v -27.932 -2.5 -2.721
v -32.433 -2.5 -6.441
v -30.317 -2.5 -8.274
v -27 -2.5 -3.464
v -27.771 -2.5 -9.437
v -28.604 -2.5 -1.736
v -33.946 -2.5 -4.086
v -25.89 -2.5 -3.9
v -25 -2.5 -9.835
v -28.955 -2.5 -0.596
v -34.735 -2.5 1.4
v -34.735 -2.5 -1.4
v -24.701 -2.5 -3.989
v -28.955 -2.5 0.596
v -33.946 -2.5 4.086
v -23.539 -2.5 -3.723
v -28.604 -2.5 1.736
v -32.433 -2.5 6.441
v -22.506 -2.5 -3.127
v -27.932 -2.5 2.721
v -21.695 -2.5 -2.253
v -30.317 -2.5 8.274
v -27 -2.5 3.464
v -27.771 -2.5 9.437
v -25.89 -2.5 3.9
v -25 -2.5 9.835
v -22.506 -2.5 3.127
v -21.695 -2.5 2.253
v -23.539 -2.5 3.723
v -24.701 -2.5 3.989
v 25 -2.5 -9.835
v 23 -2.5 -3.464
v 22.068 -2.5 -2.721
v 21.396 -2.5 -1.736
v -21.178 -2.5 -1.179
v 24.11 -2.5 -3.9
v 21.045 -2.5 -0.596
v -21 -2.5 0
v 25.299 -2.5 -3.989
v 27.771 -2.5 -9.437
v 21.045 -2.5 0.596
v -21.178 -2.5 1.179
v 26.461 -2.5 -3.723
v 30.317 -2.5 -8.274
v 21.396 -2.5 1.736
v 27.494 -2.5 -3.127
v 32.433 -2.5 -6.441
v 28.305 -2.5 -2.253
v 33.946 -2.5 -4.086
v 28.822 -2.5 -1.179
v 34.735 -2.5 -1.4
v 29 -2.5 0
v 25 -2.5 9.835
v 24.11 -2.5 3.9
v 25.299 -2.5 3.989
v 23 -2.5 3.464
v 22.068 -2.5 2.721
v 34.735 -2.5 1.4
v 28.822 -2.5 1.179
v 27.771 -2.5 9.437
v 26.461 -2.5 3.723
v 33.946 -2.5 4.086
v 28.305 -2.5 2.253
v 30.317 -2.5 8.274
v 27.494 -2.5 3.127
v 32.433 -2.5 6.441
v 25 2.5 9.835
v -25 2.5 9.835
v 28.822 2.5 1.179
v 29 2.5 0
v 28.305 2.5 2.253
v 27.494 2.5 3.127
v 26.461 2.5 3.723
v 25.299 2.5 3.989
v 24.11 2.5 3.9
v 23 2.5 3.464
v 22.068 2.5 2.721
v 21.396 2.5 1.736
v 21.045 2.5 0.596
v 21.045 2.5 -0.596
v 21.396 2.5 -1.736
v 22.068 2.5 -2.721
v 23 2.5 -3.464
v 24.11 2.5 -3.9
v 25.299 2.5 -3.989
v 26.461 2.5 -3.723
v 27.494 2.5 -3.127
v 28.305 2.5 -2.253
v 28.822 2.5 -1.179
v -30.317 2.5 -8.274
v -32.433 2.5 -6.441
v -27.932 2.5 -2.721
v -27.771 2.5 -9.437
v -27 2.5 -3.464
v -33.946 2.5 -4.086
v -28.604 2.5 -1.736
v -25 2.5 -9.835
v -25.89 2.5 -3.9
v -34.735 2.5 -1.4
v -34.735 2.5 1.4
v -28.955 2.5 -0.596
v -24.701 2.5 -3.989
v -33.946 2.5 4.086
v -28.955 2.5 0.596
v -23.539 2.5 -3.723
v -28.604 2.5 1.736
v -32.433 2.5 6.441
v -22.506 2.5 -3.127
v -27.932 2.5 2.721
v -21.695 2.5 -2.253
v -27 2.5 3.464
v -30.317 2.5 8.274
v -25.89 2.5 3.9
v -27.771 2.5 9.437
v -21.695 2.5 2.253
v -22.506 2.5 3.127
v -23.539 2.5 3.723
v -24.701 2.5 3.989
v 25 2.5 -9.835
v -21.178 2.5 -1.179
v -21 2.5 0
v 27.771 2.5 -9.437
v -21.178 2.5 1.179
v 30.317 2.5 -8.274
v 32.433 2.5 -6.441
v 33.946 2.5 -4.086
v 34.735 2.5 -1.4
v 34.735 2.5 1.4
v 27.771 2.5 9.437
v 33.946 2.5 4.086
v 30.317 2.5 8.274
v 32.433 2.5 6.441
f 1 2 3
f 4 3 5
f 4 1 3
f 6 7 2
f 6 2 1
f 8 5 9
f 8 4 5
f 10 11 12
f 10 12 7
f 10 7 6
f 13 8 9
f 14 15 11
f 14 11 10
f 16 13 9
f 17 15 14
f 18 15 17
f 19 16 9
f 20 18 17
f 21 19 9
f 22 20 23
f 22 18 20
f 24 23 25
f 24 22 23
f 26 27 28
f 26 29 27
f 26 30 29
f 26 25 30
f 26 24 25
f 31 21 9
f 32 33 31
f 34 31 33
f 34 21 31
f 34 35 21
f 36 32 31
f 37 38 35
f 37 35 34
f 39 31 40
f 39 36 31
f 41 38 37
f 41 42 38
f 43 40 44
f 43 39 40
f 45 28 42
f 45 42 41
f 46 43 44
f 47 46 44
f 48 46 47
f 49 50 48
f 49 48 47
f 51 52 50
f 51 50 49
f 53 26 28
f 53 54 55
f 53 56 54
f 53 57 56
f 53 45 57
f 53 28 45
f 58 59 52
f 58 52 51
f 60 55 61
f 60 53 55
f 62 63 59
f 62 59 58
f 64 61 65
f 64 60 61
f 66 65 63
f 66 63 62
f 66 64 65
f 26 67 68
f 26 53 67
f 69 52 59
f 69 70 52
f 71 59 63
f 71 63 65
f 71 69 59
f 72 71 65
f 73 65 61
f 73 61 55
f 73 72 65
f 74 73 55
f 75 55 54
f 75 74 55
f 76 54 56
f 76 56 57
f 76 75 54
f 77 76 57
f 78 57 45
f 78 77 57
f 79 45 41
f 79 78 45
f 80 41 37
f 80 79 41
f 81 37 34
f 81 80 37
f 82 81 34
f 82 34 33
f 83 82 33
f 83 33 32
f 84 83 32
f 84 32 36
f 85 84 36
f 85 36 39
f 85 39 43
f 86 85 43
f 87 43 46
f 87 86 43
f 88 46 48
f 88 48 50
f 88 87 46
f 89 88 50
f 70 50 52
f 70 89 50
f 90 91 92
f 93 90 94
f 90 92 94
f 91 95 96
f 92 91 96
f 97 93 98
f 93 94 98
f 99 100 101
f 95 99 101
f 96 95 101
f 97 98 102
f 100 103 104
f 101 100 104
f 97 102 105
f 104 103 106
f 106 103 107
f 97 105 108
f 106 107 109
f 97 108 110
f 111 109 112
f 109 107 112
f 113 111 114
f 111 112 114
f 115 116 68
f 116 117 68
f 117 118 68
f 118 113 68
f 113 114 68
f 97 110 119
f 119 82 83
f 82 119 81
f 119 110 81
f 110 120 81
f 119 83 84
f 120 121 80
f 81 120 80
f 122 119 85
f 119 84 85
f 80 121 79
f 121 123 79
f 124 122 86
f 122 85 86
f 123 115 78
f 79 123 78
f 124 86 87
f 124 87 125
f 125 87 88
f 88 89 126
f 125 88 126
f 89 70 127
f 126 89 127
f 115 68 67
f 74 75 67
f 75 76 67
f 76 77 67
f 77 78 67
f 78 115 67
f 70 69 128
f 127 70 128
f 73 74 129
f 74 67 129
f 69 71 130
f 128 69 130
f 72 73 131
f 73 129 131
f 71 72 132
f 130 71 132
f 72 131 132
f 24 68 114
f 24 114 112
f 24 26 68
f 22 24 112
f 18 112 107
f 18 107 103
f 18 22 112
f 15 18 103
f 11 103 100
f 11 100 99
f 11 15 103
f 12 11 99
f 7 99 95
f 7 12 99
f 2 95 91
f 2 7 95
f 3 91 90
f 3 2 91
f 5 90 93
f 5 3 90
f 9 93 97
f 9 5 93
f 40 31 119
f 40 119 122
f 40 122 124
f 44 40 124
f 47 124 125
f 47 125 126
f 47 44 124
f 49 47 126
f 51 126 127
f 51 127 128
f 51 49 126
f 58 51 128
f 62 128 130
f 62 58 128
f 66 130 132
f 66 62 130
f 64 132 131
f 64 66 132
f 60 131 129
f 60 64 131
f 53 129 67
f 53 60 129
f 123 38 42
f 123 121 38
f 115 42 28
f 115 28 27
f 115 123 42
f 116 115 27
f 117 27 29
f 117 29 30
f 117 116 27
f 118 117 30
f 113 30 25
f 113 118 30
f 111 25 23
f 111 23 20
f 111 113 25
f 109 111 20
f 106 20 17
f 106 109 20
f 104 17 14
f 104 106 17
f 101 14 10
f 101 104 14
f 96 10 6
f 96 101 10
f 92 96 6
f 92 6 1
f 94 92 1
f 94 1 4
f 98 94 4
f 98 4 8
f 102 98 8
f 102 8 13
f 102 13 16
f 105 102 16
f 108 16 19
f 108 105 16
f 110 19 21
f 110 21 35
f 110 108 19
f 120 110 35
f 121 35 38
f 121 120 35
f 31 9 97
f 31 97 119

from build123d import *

# Parameters (mm, degrees)
F0_R     = 4
F1_DEPTH = 2.5


with BuildPart() as f1:
    # F0 (on Front) → F1 (new body, symmetric)
    with BuildSketch(Plane.XZ):
        with BuildLine():
            Line((0, 9.835), (-25, 9.835))
            ThreePointArc((-25, 9.835), (-34.835, 0), (-25, -9.835))
            Line((-25, -9.835), (0, -9.835))
            Line((0, -9.835), (25, -9.835))
            ThreePointArc((25, -9.835), (34.835, 0), (25, 9.835))
            Line((25, 9.835), (0, 9.835))
        make_face()
        with Locations((-25, 0)):
            Circle(F0_R, mode=Mode.SUBTRACT)
        with Locations((25, 0)):
            Circle(F0_R, mode=Mode.SUBTRACT)
    extrude(amount=F1_DEPTH, both=True)


solid = f1.part
